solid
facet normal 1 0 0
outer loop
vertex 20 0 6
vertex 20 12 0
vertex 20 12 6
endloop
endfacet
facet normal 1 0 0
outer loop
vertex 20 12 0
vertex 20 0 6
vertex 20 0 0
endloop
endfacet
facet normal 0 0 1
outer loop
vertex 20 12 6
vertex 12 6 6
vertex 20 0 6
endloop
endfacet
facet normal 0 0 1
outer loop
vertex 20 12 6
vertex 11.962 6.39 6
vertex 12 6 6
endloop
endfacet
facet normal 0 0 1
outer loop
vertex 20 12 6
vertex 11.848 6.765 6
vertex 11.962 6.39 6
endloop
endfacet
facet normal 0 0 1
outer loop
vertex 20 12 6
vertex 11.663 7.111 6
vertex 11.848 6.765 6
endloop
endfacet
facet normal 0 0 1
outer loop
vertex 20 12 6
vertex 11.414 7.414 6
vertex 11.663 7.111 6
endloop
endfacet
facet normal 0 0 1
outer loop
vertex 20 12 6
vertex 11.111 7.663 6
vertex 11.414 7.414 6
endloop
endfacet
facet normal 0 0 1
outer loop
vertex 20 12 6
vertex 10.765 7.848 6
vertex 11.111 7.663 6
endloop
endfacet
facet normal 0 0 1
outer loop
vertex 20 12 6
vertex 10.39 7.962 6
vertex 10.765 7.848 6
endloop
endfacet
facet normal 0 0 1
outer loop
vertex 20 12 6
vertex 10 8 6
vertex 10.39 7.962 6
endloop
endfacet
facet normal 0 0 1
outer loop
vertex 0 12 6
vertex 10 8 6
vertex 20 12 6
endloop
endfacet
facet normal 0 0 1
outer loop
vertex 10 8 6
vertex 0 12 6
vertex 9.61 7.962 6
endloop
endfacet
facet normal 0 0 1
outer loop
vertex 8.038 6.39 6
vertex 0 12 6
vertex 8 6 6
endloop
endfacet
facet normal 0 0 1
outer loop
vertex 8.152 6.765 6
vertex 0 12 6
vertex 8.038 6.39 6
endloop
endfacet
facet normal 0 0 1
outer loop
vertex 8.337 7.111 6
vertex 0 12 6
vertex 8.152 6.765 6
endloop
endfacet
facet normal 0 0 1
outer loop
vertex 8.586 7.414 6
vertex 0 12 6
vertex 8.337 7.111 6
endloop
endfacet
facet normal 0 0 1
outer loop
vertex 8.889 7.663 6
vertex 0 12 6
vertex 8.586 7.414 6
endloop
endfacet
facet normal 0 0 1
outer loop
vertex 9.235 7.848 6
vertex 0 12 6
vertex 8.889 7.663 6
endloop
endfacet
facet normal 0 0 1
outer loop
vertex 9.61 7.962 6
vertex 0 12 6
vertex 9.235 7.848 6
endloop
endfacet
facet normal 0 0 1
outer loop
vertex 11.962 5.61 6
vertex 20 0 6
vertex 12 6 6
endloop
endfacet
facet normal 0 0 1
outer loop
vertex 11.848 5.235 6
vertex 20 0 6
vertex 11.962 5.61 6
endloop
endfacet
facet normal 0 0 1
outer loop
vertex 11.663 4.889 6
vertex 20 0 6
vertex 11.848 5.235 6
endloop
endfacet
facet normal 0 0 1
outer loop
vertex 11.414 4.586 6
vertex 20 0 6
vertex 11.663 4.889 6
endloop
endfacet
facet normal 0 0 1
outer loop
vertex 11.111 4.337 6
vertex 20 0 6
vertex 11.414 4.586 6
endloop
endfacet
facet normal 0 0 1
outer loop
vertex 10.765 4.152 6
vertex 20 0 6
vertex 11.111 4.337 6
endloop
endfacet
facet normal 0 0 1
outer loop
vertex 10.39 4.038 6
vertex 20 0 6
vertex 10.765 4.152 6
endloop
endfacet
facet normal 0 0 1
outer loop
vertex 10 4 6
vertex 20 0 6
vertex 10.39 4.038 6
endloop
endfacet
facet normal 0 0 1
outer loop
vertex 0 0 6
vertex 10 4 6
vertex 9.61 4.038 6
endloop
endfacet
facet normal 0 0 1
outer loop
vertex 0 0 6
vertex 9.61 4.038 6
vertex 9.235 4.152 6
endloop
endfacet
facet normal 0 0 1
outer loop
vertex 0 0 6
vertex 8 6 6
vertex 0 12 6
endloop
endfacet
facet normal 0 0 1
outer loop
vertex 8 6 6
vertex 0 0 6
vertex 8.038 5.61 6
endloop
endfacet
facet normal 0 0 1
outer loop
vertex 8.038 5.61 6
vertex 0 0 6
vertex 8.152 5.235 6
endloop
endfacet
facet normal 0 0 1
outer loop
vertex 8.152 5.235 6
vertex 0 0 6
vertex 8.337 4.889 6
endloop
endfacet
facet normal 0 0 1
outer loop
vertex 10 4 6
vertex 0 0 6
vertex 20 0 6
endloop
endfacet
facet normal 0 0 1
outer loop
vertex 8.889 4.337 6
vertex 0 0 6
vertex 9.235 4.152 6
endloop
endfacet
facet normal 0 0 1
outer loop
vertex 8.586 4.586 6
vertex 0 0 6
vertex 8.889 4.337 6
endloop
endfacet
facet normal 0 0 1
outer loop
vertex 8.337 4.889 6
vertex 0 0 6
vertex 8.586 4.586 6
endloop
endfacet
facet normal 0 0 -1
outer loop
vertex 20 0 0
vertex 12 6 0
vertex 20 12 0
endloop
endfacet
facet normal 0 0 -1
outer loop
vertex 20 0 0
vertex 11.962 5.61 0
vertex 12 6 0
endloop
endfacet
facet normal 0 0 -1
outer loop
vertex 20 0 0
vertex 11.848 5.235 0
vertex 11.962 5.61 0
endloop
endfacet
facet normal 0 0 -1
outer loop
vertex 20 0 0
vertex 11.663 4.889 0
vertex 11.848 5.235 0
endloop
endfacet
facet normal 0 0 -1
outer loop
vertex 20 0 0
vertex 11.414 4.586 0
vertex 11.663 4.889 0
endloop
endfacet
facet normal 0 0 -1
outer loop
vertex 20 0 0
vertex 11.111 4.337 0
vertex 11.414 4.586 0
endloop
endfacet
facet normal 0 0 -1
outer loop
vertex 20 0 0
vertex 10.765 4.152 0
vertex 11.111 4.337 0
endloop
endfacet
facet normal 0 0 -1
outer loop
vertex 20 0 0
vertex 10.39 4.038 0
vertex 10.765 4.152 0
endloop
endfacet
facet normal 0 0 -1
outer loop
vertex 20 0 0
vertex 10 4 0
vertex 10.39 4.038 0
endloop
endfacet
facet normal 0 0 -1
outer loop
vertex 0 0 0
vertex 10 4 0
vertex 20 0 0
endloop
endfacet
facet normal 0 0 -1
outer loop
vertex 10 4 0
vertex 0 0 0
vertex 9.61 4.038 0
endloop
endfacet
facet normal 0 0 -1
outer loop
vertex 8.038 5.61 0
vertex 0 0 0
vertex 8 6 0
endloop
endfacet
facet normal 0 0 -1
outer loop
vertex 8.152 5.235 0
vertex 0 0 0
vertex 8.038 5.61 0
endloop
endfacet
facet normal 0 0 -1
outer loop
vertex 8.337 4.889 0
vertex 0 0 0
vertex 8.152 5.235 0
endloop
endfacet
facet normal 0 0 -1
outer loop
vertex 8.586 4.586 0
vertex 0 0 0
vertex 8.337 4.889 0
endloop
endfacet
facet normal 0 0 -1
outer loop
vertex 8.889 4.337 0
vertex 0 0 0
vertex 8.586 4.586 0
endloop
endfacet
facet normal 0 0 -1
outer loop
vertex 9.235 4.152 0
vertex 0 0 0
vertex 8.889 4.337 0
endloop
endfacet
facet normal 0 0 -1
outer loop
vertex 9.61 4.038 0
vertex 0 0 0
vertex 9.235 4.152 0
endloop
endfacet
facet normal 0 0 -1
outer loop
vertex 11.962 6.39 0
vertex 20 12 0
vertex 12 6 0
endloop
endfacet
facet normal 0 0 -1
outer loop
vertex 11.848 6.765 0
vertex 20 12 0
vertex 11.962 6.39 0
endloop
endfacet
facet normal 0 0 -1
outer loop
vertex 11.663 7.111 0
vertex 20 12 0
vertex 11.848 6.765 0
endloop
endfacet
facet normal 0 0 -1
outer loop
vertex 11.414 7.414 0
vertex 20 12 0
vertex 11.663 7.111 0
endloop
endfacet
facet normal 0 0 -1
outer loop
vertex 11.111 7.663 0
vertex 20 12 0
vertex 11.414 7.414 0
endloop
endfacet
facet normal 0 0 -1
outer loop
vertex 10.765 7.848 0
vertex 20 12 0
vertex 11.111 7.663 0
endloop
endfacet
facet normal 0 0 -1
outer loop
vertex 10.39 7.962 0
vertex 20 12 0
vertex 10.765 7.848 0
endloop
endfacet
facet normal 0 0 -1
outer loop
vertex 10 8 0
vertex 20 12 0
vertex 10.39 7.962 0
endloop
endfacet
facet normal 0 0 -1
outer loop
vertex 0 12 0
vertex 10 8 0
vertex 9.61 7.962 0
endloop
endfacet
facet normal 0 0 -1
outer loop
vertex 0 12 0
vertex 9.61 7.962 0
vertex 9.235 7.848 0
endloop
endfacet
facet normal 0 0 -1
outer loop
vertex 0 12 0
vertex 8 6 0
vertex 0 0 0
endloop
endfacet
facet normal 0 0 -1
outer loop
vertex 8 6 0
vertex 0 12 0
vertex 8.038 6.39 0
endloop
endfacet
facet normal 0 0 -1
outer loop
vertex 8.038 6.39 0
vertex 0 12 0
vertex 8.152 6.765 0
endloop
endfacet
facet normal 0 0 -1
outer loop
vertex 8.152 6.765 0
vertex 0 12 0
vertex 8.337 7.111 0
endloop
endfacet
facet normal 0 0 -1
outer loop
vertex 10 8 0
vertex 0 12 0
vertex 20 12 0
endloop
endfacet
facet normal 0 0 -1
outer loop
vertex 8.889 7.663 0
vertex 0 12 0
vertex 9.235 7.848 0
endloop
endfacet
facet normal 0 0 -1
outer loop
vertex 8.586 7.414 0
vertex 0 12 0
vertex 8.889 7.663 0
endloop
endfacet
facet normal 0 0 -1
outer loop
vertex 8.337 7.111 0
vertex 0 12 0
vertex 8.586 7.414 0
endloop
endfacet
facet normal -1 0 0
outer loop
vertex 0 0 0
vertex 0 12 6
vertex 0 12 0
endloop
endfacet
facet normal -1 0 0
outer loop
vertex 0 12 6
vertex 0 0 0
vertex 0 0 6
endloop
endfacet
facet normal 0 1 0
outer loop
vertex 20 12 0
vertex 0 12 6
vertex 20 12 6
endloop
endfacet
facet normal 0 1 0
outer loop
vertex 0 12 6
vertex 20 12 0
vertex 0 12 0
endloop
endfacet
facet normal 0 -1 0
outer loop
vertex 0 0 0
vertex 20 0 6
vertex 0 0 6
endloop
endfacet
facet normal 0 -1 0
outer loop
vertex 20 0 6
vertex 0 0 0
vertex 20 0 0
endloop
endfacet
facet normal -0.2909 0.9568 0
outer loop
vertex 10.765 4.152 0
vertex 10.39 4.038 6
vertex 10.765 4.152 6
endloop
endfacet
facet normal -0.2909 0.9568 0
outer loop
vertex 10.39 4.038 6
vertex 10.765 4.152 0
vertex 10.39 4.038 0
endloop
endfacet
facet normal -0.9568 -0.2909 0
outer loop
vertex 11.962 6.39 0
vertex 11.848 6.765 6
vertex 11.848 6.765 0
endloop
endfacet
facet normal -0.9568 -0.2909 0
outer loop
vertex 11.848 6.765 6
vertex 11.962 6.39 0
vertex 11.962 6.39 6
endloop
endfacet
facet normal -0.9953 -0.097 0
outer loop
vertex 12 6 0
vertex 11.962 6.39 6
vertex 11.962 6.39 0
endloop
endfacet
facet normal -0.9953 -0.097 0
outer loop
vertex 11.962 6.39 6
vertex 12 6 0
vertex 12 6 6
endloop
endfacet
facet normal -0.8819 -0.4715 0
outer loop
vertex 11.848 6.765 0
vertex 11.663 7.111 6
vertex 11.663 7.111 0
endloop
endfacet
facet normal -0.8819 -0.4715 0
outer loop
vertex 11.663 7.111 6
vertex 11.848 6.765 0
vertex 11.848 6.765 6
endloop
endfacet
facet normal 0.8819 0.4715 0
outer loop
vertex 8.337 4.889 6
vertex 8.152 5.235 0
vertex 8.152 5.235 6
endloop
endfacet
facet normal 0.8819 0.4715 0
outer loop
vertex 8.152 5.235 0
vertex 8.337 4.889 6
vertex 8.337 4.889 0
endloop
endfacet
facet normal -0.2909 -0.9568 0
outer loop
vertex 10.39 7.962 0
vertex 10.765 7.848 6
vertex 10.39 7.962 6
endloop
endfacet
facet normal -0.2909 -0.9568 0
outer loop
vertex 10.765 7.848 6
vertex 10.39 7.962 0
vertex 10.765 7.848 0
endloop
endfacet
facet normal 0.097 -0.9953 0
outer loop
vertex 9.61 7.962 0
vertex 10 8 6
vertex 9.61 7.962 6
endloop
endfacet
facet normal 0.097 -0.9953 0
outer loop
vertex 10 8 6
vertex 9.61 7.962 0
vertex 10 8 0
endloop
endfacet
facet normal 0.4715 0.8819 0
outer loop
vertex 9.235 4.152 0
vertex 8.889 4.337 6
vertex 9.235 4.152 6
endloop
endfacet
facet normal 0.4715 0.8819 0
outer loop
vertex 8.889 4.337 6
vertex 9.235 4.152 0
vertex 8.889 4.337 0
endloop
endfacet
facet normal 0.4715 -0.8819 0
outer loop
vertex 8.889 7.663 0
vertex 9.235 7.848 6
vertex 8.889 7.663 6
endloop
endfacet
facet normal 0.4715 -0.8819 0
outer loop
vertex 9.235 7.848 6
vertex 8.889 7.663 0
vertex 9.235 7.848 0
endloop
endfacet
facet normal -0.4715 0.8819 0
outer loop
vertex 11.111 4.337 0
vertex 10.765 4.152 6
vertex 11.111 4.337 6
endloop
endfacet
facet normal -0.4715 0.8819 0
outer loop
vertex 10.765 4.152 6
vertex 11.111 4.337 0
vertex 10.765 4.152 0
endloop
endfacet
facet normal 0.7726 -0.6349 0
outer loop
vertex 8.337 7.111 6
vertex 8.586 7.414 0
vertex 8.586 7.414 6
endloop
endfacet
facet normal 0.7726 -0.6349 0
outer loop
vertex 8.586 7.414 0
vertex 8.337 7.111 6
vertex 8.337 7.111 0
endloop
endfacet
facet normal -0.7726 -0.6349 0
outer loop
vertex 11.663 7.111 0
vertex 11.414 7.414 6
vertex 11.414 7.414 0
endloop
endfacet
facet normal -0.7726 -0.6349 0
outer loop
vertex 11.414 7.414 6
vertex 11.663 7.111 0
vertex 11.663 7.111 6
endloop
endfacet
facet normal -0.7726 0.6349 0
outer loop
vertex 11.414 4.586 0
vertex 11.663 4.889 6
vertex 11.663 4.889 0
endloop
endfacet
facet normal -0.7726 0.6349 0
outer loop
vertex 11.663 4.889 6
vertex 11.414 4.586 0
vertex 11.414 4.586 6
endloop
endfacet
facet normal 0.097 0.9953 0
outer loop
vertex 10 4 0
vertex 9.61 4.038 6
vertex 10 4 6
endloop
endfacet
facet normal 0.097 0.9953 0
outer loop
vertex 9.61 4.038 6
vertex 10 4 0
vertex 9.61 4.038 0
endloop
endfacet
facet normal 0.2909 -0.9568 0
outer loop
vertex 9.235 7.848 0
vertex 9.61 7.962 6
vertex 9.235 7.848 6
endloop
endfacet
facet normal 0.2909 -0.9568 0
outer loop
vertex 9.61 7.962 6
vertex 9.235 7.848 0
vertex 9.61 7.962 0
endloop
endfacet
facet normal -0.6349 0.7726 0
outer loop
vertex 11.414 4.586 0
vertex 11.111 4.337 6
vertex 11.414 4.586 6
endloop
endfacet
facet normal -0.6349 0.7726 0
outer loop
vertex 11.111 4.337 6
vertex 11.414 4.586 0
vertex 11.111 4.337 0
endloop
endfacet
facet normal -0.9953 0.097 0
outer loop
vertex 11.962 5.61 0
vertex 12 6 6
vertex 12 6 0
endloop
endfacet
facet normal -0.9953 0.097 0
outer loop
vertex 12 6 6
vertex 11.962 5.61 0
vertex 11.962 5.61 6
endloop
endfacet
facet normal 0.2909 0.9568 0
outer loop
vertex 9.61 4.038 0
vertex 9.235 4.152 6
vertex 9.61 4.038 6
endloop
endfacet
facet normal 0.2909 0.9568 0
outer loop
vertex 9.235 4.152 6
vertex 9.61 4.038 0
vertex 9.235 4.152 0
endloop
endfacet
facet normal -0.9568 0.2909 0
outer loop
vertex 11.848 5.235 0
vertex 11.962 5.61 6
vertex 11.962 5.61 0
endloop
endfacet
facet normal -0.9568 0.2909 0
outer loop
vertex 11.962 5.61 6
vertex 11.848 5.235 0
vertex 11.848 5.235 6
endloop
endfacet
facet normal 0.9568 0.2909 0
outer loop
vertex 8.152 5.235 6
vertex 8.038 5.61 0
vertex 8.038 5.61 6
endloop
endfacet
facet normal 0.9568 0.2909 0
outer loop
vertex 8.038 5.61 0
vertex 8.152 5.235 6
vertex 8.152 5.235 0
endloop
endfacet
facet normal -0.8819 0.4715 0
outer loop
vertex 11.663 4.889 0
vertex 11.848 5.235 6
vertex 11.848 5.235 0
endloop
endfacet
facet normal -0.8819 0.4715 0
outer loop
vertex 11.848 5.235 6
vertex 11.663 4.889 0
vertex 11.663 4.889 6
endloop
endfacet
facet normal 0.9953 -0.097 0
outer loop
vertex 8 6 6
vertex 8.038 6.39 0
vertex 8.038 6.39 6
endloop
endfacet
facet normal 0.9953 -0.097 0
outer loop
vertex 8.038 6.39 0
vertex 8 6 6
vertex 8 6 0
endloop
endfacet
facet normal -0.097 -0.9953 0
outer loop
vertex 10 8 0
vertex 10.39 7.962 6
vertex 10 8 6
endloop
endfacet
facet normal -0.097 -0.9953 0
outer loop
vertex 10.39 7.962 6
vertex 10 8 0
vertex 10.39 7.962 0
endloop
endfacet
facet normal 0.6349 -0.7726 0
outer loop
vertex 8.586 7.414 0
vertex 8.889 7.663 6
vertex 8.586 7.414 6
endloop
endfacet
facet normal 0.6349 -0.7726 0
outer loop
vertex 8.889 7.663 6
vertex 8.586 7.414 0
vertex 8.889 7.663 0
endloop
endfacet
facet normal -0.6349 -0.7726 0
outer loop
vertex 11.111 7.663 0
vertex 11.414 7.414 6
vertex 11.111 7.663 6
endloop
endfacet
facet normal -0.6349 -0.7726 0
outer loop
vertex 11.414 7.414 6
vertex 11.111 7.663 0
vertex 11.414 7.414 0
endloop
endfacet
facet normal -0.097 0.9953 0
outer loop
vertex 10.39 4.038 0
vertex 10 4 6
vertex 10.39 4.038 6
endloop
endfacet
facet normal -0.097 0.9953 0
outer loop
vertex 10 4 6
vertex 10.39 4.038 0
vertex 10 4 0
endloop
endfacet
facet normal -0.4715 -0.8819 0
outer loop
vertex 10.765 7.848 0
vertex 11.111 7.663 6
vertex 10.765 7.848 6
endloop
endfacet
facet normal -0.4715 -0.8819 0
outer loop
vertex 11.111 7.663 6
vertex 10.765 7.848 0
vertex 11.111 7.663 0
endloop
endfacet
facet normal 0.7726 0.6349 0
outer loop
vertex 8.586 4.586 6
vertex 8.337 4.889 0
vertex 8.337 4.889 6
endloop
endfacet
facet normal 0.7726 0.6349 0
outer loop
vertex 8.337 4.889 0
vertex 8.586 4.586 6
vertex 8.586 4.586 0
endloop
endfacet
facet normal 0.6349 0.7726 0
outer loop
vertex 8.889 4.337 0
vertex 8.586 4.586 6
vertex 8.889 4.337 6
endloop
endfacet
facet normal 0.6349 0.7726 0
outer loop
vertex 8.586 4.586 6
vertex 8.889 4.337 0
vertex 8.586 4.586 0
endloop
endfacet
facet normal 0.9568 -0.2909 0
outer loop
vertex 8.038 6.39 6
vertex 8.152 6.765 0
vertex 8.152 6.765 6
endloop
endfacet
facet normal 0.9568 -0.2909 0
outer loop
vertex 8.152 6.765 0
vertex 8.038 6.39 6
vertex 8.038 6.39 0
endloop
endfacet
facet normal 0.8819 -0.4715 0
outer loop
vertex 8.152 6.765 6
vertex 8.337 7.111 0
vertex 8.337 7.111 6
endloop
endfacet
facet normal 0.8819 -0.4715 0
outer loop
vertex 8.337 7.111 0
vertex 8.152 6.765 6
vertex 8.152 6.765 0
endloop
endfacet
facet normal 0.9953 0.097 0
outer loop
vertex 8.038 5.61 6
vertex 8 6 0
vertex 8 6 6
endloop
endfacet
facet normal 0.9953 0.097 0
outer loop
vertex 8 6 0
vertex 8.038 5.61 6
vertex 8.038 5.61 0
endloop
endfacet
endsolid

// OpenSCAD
$fn = 32;

// ----------------------------------------------------------------------
// Micro pad: drilled pad, 5-20 mm class
// ----------------------------------------------------------------------

// --- parameters (mm) ---
pad_l = 20;               // pad length, X
pad_w = 12;               // pad width, Y
pad_t = 6;                // pad thickness, Z
hole_d = 4;               // through hole diameter

difference() {
  cube([pad_l, pad_w, pad_t]);
  translate([pad_l / 2, pad_w / 2, -1])
    cylinder(h = pad_t + 2, d = hole_d);
}
